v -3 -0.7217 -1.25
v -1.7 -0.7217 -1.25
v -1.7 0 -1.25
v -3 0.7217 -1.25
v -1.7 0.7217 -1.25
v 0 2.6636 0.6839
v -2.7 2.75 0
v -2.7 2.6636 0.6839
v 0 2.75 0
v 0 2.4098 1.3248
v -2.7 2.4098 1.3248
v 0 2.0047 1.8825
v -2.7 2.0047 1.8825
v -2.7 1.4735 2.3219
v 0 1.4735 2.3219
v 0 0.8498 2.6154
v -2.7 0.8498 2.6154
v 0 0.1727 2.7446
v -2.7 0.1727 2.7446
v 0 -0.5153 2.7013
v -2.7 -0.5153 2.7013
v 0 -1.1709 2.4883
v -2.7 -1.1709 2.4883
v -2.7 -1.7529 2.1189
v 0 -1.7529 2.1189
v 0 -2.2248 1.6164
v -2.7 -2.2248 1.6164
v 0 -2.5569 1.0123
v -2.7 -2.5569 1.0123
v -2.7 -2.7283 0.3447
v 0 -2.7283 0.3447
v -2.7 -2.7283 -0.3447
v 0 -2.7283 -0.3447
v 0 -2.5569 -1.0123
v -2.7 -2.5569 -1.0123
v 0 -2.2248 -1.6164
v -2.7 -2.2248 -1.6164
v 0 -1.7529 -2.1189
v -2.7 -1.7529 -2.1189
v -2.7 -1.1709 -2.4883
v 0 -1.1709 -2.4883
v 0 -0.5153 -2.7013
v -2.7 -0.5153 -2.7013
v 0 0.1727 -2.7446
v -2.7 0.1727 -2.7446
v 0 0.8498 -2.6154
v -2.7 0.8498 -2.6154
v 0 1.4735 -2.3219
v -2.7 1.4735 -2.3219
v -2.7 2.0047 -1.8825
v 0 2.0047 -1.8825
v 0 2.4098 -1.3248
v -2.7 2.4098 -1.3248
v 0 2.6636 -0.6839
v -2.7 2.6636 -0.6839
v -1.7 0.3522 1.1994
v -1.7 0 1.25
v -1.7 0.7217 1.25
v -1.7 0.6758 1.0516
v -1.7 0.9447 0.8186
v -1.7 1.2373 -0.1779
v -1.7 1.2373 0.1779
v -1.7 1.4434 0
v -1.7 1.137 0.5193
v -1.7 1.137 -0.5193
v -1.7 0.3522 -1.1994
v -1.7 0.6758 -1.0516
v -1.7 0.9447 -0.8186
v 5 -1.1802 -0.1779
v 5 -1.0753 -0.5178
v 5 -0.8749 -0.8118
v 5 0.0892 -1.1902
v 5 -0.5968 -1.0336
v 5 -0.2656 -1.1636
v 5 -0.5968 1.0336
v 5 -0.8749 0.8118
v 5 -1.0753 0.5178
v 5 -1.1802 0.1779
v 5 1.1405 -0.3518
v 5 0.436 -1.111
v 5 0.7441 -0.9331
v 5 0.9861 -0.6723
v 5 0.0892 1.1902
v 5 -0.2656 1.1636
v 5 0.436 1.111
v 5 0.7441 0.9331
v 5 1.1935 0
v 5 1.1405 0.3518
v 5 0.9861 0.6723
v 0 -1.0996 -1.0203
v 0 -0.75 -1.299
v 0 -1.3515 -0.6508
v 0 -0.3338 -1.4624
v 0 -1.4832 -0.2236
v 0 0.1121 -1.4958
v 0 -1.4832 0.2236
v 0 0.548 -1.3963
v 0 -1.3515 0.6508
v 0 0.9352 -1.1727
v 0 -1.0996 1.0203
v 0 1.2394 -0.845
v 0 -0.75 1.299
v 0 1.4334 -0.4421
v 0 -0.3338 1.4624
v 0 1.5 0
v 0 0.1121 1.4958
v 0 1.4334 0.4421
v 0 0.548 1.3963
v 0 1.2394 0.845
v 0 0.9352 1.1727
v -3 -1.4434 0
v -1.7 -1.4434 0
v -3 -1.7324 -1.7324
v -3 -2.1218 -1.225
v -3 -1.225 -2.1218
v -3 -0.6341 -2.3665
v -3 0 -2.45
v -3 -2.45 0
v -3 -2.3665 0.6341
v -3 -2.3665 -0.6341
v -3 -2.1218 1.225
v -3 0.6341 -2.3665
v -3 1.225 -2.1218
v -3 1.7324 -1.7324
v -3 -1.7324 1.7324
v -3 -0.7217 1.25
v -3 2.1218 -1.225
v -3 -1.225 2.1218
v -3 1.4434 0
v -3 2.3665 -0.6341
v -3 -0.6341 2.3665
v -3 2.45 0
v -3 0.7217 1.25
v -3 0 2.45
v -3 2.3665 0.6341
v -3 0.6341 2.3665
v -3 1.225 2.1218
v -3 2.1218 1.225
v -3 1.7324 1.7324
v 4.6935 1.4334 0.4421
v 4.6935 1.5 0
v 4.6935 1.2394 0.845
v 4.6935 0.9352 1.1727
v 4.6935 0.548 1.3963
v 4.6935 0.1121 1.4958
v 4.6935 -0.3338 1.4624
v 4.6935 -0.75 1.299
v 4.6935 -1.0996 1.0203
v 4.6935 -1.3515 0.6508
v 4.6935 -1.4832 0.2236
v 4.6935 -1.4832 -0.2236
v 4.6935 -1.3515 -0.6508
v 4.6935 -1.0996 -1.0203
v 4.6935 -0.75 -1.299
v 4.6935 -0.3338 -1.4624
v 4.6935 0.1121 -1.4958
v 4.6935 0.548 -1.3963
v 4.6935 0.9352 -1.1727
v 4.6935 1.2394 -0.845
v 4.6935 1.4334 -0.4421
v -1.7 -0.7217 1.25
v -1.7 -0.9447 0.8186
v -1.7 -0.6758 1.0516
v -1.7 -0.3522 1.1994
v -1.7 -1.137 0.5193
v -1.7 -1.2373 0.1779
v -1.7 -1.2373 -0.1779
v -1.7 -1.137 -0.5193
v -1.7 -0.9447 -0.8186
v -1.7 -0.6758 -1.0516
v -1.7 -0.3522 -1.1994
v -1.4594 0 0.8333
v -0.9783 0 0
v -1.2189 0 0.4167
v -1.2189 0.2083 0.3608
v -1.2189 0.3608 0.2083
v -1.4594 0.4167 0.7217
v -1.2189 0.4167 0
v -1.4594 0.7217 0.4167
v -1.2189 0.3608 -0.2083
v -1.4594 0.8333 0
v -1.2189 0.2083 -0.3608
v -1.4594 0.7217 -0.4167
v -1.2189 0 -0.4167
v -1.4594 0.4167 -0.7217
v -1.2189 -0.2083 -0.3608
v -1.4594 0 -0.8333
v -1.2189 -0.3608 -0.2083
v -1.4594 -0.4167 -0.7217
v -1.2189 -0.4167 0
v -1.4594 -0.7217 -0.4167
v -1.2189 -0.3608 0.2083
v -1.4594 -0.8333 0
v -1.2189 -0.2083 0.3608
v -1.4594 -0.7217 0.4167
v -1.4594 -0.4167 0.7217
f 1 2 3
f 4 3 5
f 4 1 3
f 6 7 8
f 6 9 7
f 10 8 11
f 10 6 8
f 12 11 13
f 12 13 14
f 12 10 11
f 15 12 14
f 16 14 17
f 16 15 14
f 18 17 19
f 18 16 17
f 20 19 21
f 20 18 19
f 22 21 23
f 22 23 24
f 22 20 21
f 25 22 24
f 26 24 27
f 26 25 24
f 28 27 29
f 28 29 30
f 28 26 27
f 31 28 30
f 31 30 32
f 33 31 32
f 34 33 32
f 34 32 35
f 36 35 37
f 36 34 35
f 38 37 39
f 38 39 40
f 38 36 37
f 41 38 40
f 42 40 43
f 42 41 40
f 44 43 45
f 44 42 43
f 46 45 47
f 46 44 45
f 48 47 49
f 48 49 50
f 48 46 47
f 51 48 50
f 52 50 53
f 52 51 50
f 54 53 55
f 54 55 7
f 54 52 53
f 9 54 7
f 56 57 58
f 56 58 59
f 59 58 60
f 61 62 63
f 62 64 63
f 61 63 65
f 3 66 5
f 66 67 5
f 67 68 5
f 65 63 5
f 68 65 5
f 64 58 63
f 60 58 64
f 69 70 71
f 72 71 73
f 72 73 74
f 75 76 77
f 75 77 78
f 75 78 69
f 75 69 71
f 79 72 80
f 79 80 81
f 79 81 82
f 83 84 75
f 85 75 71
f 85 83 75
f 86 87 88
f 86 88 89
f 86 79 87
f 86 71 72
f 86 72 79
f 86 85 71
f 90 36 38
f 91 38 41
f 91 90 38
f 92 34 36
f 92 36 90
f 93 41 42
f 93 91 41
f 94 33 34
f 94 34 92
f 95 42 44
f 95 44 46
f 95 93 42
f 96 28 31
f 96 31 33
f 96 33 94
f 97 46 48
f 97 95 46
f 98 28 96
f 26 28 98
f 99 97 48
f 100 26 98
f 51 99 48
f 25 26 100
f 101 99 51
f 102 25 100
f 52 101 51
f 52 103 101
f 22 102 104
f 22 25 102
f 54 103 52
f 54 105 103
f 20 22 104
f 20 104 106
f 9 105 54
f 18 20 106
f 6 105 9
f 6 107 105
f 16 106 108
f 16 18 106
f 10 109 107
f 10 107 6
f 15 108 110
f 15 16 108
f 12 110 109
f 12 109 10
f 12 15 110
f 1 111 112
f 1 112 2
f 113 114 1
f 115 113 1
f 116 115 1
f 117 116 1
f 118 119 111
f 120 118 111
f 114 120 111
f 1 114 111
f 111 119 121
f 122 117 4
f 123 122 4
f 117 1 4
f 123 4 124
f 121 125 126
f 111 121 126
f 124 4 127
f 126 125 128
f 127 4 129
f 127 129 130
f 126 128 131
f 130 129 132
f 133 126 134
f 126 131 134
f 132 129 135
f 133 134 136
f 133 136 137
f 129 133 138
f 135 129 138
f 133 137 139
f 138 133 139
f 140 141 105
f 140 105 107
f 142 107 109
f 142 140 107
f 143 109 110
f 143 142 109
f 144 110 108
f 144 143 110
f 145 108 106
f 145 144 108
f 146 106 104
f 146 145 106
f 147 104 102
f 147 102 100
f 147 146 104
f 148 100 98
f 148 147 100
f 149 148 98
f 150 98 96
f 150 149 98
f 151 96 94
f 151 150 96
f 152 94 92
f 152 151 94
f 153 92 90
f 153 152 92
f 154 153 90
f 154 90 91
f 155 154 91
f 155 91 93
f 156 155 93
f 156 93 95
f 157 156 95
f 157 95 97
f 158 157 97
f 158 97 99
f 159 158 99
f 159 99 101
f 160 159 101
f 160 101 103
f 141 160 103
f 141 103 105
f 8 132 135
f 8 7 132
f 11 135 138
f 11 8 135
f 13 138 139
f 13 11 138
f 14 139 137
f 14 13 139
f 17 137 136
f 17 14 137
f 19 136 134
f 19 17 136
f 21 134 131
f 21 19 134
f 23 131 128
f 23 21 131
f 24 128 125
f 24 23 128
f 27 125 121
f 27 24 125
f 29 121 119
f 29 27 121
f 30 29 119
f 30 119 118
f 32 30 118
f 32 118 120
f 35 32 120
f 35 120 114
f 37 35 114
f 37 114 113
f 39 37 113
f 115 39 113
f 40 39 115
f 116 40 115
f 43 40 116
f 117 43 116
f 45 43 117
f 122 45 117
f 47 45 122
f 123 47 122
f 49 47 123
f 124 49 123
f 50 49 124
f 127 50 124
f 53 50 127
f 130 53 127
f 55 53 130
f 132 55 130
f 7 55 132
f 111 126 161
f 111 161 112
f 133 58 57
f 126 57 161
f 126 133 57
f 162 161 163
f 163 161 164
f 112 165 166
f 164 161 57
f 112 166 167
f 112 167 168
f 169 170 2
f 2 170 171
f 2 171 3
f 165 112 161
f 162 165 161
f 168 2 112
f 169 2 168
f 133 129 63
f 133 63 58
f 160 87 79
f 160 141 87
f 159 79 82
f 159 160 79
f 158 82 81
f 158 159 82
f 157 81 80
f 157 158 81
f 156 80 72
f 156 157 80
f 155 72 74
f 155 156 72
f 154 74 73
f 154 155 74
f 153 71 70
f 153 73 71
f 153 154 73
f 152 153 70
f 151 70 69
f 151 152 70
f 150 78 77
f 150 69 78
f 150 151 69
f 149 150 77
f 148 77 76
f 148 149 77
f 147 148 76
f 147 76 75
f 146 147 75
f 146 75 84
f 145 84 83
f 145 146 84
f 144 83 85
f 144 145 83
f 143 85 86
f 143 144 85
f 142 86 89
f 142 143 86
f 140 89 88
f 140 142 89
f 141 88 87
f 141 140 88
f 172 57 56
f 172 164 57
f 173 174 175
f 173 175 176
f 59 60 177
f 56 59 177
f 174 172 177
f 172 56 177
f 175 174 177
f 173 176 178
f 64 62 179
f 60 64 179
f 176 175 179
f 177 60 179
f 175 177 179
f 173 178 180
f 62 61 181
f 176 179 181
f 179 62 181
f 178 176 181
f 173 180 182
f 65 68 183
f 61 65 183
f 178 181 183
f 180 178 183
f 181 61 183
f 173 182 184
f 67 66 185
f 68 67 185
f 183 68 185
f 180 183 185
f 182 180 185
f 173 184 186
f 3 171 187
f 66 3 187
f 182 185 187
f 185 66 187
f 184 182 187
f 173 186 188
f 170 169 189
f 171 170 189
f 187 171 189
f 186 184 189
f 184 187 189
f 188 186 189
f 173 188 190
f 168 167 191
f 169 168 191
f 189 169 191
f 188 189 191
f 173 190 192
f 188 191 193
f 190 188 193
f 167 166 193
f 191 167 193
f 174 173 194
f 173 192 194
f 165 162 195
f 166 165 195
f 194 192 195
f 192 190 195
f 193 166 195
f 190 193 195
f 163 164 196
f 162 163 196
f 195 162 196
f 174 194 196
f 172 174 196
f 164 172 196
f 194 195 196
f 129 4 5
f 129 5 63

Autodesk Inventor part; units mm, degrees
sketch "Sketch_1" plane through (0, 0, 0) normal (0, 0, 1) x (1, 0, 0)
  line L0 (5, 0) -> (-3, 0)
  line L1 (-3, 0) -> (-3, 2.45)
  line L2 (-3, 2.45) -> (-2.7, 2.75)
  line L3 (-2.7, 2.75) -> (0, 2.75)
  line L4 (0, 2.75) -> (0, 1.5)
  line L5 (0, 1.5) -> (4.6935, 1.5)
  line L6 (4.6935, 1.5) -> (5, 1.1935)
  line L7 (5, 1.1935) -> (5, 0)
  line L8 (5, 0) -> (-3, 0)
revolve "Revolution1" add sketch "Sketch_1" angle 360 about axis through (5, 0, 0) along (1, 0, 0)
thread "Thread1" size "M3x0.5" class "6g" standard "ISO Metric profile" length 4.1935
sketch "Sketch2" plane through (-3, 0, 0) normal (-1, 0, 0) x (0, 0, 1)
  point P0 (0, 0)
hole "Hole1" at (-3, 0, 0) direction (1, 0, 0) diameter 2.5 depth 1.3 tip angle 120
sketch "Sketch_3" plane through (-3, 0, 0) normal (1, 0, 0) x (0, 0, -1)
  line L0 (-1.25, -0.7217) -> (0, -1.4434)
  line L1 (0, -1.4434) -> (1.25, -0.7217)
  line L2 (1.25, -0.7217) -> (1.25, 0.7217)
  line L3 (1.25, 0.7217) -> (0, 1.4434)
  line L4 (0, 1.4434) -> (-1.25, 0.7217)
  line L5 (-1.25, 0.7217) -> (-1.25, -0.7217)
extrude "Extrusion1" cut sketch "Sketch_3" along normal blind 1.3
ref_plane "bolt_XY" through (5, 0, 0) normal (1, 0, 0) x (0, 0, -1)
ref_plane "bolt_YZ" through (5, 0, 0) normal (0, 0, -1) x (0, 1, 0)
ref_plane "bolt_ZX" through (5, 0, 0) normal (0, 1, 0) x (1, 0, 0)
ref_plane "nut_XY" through (0, 0, 0) normal (1, 0, 0) x (0, 0, -1)
ref_plane "nut_YZ" through (0, 0, 0) normal (0, 0, -1) x (0, 1, 0)
ref_plane "nut_ZX" through (0, 0, 0) normal (0, 1, 0) x (1, 0, 0)
properties part number "CBE3-5"
